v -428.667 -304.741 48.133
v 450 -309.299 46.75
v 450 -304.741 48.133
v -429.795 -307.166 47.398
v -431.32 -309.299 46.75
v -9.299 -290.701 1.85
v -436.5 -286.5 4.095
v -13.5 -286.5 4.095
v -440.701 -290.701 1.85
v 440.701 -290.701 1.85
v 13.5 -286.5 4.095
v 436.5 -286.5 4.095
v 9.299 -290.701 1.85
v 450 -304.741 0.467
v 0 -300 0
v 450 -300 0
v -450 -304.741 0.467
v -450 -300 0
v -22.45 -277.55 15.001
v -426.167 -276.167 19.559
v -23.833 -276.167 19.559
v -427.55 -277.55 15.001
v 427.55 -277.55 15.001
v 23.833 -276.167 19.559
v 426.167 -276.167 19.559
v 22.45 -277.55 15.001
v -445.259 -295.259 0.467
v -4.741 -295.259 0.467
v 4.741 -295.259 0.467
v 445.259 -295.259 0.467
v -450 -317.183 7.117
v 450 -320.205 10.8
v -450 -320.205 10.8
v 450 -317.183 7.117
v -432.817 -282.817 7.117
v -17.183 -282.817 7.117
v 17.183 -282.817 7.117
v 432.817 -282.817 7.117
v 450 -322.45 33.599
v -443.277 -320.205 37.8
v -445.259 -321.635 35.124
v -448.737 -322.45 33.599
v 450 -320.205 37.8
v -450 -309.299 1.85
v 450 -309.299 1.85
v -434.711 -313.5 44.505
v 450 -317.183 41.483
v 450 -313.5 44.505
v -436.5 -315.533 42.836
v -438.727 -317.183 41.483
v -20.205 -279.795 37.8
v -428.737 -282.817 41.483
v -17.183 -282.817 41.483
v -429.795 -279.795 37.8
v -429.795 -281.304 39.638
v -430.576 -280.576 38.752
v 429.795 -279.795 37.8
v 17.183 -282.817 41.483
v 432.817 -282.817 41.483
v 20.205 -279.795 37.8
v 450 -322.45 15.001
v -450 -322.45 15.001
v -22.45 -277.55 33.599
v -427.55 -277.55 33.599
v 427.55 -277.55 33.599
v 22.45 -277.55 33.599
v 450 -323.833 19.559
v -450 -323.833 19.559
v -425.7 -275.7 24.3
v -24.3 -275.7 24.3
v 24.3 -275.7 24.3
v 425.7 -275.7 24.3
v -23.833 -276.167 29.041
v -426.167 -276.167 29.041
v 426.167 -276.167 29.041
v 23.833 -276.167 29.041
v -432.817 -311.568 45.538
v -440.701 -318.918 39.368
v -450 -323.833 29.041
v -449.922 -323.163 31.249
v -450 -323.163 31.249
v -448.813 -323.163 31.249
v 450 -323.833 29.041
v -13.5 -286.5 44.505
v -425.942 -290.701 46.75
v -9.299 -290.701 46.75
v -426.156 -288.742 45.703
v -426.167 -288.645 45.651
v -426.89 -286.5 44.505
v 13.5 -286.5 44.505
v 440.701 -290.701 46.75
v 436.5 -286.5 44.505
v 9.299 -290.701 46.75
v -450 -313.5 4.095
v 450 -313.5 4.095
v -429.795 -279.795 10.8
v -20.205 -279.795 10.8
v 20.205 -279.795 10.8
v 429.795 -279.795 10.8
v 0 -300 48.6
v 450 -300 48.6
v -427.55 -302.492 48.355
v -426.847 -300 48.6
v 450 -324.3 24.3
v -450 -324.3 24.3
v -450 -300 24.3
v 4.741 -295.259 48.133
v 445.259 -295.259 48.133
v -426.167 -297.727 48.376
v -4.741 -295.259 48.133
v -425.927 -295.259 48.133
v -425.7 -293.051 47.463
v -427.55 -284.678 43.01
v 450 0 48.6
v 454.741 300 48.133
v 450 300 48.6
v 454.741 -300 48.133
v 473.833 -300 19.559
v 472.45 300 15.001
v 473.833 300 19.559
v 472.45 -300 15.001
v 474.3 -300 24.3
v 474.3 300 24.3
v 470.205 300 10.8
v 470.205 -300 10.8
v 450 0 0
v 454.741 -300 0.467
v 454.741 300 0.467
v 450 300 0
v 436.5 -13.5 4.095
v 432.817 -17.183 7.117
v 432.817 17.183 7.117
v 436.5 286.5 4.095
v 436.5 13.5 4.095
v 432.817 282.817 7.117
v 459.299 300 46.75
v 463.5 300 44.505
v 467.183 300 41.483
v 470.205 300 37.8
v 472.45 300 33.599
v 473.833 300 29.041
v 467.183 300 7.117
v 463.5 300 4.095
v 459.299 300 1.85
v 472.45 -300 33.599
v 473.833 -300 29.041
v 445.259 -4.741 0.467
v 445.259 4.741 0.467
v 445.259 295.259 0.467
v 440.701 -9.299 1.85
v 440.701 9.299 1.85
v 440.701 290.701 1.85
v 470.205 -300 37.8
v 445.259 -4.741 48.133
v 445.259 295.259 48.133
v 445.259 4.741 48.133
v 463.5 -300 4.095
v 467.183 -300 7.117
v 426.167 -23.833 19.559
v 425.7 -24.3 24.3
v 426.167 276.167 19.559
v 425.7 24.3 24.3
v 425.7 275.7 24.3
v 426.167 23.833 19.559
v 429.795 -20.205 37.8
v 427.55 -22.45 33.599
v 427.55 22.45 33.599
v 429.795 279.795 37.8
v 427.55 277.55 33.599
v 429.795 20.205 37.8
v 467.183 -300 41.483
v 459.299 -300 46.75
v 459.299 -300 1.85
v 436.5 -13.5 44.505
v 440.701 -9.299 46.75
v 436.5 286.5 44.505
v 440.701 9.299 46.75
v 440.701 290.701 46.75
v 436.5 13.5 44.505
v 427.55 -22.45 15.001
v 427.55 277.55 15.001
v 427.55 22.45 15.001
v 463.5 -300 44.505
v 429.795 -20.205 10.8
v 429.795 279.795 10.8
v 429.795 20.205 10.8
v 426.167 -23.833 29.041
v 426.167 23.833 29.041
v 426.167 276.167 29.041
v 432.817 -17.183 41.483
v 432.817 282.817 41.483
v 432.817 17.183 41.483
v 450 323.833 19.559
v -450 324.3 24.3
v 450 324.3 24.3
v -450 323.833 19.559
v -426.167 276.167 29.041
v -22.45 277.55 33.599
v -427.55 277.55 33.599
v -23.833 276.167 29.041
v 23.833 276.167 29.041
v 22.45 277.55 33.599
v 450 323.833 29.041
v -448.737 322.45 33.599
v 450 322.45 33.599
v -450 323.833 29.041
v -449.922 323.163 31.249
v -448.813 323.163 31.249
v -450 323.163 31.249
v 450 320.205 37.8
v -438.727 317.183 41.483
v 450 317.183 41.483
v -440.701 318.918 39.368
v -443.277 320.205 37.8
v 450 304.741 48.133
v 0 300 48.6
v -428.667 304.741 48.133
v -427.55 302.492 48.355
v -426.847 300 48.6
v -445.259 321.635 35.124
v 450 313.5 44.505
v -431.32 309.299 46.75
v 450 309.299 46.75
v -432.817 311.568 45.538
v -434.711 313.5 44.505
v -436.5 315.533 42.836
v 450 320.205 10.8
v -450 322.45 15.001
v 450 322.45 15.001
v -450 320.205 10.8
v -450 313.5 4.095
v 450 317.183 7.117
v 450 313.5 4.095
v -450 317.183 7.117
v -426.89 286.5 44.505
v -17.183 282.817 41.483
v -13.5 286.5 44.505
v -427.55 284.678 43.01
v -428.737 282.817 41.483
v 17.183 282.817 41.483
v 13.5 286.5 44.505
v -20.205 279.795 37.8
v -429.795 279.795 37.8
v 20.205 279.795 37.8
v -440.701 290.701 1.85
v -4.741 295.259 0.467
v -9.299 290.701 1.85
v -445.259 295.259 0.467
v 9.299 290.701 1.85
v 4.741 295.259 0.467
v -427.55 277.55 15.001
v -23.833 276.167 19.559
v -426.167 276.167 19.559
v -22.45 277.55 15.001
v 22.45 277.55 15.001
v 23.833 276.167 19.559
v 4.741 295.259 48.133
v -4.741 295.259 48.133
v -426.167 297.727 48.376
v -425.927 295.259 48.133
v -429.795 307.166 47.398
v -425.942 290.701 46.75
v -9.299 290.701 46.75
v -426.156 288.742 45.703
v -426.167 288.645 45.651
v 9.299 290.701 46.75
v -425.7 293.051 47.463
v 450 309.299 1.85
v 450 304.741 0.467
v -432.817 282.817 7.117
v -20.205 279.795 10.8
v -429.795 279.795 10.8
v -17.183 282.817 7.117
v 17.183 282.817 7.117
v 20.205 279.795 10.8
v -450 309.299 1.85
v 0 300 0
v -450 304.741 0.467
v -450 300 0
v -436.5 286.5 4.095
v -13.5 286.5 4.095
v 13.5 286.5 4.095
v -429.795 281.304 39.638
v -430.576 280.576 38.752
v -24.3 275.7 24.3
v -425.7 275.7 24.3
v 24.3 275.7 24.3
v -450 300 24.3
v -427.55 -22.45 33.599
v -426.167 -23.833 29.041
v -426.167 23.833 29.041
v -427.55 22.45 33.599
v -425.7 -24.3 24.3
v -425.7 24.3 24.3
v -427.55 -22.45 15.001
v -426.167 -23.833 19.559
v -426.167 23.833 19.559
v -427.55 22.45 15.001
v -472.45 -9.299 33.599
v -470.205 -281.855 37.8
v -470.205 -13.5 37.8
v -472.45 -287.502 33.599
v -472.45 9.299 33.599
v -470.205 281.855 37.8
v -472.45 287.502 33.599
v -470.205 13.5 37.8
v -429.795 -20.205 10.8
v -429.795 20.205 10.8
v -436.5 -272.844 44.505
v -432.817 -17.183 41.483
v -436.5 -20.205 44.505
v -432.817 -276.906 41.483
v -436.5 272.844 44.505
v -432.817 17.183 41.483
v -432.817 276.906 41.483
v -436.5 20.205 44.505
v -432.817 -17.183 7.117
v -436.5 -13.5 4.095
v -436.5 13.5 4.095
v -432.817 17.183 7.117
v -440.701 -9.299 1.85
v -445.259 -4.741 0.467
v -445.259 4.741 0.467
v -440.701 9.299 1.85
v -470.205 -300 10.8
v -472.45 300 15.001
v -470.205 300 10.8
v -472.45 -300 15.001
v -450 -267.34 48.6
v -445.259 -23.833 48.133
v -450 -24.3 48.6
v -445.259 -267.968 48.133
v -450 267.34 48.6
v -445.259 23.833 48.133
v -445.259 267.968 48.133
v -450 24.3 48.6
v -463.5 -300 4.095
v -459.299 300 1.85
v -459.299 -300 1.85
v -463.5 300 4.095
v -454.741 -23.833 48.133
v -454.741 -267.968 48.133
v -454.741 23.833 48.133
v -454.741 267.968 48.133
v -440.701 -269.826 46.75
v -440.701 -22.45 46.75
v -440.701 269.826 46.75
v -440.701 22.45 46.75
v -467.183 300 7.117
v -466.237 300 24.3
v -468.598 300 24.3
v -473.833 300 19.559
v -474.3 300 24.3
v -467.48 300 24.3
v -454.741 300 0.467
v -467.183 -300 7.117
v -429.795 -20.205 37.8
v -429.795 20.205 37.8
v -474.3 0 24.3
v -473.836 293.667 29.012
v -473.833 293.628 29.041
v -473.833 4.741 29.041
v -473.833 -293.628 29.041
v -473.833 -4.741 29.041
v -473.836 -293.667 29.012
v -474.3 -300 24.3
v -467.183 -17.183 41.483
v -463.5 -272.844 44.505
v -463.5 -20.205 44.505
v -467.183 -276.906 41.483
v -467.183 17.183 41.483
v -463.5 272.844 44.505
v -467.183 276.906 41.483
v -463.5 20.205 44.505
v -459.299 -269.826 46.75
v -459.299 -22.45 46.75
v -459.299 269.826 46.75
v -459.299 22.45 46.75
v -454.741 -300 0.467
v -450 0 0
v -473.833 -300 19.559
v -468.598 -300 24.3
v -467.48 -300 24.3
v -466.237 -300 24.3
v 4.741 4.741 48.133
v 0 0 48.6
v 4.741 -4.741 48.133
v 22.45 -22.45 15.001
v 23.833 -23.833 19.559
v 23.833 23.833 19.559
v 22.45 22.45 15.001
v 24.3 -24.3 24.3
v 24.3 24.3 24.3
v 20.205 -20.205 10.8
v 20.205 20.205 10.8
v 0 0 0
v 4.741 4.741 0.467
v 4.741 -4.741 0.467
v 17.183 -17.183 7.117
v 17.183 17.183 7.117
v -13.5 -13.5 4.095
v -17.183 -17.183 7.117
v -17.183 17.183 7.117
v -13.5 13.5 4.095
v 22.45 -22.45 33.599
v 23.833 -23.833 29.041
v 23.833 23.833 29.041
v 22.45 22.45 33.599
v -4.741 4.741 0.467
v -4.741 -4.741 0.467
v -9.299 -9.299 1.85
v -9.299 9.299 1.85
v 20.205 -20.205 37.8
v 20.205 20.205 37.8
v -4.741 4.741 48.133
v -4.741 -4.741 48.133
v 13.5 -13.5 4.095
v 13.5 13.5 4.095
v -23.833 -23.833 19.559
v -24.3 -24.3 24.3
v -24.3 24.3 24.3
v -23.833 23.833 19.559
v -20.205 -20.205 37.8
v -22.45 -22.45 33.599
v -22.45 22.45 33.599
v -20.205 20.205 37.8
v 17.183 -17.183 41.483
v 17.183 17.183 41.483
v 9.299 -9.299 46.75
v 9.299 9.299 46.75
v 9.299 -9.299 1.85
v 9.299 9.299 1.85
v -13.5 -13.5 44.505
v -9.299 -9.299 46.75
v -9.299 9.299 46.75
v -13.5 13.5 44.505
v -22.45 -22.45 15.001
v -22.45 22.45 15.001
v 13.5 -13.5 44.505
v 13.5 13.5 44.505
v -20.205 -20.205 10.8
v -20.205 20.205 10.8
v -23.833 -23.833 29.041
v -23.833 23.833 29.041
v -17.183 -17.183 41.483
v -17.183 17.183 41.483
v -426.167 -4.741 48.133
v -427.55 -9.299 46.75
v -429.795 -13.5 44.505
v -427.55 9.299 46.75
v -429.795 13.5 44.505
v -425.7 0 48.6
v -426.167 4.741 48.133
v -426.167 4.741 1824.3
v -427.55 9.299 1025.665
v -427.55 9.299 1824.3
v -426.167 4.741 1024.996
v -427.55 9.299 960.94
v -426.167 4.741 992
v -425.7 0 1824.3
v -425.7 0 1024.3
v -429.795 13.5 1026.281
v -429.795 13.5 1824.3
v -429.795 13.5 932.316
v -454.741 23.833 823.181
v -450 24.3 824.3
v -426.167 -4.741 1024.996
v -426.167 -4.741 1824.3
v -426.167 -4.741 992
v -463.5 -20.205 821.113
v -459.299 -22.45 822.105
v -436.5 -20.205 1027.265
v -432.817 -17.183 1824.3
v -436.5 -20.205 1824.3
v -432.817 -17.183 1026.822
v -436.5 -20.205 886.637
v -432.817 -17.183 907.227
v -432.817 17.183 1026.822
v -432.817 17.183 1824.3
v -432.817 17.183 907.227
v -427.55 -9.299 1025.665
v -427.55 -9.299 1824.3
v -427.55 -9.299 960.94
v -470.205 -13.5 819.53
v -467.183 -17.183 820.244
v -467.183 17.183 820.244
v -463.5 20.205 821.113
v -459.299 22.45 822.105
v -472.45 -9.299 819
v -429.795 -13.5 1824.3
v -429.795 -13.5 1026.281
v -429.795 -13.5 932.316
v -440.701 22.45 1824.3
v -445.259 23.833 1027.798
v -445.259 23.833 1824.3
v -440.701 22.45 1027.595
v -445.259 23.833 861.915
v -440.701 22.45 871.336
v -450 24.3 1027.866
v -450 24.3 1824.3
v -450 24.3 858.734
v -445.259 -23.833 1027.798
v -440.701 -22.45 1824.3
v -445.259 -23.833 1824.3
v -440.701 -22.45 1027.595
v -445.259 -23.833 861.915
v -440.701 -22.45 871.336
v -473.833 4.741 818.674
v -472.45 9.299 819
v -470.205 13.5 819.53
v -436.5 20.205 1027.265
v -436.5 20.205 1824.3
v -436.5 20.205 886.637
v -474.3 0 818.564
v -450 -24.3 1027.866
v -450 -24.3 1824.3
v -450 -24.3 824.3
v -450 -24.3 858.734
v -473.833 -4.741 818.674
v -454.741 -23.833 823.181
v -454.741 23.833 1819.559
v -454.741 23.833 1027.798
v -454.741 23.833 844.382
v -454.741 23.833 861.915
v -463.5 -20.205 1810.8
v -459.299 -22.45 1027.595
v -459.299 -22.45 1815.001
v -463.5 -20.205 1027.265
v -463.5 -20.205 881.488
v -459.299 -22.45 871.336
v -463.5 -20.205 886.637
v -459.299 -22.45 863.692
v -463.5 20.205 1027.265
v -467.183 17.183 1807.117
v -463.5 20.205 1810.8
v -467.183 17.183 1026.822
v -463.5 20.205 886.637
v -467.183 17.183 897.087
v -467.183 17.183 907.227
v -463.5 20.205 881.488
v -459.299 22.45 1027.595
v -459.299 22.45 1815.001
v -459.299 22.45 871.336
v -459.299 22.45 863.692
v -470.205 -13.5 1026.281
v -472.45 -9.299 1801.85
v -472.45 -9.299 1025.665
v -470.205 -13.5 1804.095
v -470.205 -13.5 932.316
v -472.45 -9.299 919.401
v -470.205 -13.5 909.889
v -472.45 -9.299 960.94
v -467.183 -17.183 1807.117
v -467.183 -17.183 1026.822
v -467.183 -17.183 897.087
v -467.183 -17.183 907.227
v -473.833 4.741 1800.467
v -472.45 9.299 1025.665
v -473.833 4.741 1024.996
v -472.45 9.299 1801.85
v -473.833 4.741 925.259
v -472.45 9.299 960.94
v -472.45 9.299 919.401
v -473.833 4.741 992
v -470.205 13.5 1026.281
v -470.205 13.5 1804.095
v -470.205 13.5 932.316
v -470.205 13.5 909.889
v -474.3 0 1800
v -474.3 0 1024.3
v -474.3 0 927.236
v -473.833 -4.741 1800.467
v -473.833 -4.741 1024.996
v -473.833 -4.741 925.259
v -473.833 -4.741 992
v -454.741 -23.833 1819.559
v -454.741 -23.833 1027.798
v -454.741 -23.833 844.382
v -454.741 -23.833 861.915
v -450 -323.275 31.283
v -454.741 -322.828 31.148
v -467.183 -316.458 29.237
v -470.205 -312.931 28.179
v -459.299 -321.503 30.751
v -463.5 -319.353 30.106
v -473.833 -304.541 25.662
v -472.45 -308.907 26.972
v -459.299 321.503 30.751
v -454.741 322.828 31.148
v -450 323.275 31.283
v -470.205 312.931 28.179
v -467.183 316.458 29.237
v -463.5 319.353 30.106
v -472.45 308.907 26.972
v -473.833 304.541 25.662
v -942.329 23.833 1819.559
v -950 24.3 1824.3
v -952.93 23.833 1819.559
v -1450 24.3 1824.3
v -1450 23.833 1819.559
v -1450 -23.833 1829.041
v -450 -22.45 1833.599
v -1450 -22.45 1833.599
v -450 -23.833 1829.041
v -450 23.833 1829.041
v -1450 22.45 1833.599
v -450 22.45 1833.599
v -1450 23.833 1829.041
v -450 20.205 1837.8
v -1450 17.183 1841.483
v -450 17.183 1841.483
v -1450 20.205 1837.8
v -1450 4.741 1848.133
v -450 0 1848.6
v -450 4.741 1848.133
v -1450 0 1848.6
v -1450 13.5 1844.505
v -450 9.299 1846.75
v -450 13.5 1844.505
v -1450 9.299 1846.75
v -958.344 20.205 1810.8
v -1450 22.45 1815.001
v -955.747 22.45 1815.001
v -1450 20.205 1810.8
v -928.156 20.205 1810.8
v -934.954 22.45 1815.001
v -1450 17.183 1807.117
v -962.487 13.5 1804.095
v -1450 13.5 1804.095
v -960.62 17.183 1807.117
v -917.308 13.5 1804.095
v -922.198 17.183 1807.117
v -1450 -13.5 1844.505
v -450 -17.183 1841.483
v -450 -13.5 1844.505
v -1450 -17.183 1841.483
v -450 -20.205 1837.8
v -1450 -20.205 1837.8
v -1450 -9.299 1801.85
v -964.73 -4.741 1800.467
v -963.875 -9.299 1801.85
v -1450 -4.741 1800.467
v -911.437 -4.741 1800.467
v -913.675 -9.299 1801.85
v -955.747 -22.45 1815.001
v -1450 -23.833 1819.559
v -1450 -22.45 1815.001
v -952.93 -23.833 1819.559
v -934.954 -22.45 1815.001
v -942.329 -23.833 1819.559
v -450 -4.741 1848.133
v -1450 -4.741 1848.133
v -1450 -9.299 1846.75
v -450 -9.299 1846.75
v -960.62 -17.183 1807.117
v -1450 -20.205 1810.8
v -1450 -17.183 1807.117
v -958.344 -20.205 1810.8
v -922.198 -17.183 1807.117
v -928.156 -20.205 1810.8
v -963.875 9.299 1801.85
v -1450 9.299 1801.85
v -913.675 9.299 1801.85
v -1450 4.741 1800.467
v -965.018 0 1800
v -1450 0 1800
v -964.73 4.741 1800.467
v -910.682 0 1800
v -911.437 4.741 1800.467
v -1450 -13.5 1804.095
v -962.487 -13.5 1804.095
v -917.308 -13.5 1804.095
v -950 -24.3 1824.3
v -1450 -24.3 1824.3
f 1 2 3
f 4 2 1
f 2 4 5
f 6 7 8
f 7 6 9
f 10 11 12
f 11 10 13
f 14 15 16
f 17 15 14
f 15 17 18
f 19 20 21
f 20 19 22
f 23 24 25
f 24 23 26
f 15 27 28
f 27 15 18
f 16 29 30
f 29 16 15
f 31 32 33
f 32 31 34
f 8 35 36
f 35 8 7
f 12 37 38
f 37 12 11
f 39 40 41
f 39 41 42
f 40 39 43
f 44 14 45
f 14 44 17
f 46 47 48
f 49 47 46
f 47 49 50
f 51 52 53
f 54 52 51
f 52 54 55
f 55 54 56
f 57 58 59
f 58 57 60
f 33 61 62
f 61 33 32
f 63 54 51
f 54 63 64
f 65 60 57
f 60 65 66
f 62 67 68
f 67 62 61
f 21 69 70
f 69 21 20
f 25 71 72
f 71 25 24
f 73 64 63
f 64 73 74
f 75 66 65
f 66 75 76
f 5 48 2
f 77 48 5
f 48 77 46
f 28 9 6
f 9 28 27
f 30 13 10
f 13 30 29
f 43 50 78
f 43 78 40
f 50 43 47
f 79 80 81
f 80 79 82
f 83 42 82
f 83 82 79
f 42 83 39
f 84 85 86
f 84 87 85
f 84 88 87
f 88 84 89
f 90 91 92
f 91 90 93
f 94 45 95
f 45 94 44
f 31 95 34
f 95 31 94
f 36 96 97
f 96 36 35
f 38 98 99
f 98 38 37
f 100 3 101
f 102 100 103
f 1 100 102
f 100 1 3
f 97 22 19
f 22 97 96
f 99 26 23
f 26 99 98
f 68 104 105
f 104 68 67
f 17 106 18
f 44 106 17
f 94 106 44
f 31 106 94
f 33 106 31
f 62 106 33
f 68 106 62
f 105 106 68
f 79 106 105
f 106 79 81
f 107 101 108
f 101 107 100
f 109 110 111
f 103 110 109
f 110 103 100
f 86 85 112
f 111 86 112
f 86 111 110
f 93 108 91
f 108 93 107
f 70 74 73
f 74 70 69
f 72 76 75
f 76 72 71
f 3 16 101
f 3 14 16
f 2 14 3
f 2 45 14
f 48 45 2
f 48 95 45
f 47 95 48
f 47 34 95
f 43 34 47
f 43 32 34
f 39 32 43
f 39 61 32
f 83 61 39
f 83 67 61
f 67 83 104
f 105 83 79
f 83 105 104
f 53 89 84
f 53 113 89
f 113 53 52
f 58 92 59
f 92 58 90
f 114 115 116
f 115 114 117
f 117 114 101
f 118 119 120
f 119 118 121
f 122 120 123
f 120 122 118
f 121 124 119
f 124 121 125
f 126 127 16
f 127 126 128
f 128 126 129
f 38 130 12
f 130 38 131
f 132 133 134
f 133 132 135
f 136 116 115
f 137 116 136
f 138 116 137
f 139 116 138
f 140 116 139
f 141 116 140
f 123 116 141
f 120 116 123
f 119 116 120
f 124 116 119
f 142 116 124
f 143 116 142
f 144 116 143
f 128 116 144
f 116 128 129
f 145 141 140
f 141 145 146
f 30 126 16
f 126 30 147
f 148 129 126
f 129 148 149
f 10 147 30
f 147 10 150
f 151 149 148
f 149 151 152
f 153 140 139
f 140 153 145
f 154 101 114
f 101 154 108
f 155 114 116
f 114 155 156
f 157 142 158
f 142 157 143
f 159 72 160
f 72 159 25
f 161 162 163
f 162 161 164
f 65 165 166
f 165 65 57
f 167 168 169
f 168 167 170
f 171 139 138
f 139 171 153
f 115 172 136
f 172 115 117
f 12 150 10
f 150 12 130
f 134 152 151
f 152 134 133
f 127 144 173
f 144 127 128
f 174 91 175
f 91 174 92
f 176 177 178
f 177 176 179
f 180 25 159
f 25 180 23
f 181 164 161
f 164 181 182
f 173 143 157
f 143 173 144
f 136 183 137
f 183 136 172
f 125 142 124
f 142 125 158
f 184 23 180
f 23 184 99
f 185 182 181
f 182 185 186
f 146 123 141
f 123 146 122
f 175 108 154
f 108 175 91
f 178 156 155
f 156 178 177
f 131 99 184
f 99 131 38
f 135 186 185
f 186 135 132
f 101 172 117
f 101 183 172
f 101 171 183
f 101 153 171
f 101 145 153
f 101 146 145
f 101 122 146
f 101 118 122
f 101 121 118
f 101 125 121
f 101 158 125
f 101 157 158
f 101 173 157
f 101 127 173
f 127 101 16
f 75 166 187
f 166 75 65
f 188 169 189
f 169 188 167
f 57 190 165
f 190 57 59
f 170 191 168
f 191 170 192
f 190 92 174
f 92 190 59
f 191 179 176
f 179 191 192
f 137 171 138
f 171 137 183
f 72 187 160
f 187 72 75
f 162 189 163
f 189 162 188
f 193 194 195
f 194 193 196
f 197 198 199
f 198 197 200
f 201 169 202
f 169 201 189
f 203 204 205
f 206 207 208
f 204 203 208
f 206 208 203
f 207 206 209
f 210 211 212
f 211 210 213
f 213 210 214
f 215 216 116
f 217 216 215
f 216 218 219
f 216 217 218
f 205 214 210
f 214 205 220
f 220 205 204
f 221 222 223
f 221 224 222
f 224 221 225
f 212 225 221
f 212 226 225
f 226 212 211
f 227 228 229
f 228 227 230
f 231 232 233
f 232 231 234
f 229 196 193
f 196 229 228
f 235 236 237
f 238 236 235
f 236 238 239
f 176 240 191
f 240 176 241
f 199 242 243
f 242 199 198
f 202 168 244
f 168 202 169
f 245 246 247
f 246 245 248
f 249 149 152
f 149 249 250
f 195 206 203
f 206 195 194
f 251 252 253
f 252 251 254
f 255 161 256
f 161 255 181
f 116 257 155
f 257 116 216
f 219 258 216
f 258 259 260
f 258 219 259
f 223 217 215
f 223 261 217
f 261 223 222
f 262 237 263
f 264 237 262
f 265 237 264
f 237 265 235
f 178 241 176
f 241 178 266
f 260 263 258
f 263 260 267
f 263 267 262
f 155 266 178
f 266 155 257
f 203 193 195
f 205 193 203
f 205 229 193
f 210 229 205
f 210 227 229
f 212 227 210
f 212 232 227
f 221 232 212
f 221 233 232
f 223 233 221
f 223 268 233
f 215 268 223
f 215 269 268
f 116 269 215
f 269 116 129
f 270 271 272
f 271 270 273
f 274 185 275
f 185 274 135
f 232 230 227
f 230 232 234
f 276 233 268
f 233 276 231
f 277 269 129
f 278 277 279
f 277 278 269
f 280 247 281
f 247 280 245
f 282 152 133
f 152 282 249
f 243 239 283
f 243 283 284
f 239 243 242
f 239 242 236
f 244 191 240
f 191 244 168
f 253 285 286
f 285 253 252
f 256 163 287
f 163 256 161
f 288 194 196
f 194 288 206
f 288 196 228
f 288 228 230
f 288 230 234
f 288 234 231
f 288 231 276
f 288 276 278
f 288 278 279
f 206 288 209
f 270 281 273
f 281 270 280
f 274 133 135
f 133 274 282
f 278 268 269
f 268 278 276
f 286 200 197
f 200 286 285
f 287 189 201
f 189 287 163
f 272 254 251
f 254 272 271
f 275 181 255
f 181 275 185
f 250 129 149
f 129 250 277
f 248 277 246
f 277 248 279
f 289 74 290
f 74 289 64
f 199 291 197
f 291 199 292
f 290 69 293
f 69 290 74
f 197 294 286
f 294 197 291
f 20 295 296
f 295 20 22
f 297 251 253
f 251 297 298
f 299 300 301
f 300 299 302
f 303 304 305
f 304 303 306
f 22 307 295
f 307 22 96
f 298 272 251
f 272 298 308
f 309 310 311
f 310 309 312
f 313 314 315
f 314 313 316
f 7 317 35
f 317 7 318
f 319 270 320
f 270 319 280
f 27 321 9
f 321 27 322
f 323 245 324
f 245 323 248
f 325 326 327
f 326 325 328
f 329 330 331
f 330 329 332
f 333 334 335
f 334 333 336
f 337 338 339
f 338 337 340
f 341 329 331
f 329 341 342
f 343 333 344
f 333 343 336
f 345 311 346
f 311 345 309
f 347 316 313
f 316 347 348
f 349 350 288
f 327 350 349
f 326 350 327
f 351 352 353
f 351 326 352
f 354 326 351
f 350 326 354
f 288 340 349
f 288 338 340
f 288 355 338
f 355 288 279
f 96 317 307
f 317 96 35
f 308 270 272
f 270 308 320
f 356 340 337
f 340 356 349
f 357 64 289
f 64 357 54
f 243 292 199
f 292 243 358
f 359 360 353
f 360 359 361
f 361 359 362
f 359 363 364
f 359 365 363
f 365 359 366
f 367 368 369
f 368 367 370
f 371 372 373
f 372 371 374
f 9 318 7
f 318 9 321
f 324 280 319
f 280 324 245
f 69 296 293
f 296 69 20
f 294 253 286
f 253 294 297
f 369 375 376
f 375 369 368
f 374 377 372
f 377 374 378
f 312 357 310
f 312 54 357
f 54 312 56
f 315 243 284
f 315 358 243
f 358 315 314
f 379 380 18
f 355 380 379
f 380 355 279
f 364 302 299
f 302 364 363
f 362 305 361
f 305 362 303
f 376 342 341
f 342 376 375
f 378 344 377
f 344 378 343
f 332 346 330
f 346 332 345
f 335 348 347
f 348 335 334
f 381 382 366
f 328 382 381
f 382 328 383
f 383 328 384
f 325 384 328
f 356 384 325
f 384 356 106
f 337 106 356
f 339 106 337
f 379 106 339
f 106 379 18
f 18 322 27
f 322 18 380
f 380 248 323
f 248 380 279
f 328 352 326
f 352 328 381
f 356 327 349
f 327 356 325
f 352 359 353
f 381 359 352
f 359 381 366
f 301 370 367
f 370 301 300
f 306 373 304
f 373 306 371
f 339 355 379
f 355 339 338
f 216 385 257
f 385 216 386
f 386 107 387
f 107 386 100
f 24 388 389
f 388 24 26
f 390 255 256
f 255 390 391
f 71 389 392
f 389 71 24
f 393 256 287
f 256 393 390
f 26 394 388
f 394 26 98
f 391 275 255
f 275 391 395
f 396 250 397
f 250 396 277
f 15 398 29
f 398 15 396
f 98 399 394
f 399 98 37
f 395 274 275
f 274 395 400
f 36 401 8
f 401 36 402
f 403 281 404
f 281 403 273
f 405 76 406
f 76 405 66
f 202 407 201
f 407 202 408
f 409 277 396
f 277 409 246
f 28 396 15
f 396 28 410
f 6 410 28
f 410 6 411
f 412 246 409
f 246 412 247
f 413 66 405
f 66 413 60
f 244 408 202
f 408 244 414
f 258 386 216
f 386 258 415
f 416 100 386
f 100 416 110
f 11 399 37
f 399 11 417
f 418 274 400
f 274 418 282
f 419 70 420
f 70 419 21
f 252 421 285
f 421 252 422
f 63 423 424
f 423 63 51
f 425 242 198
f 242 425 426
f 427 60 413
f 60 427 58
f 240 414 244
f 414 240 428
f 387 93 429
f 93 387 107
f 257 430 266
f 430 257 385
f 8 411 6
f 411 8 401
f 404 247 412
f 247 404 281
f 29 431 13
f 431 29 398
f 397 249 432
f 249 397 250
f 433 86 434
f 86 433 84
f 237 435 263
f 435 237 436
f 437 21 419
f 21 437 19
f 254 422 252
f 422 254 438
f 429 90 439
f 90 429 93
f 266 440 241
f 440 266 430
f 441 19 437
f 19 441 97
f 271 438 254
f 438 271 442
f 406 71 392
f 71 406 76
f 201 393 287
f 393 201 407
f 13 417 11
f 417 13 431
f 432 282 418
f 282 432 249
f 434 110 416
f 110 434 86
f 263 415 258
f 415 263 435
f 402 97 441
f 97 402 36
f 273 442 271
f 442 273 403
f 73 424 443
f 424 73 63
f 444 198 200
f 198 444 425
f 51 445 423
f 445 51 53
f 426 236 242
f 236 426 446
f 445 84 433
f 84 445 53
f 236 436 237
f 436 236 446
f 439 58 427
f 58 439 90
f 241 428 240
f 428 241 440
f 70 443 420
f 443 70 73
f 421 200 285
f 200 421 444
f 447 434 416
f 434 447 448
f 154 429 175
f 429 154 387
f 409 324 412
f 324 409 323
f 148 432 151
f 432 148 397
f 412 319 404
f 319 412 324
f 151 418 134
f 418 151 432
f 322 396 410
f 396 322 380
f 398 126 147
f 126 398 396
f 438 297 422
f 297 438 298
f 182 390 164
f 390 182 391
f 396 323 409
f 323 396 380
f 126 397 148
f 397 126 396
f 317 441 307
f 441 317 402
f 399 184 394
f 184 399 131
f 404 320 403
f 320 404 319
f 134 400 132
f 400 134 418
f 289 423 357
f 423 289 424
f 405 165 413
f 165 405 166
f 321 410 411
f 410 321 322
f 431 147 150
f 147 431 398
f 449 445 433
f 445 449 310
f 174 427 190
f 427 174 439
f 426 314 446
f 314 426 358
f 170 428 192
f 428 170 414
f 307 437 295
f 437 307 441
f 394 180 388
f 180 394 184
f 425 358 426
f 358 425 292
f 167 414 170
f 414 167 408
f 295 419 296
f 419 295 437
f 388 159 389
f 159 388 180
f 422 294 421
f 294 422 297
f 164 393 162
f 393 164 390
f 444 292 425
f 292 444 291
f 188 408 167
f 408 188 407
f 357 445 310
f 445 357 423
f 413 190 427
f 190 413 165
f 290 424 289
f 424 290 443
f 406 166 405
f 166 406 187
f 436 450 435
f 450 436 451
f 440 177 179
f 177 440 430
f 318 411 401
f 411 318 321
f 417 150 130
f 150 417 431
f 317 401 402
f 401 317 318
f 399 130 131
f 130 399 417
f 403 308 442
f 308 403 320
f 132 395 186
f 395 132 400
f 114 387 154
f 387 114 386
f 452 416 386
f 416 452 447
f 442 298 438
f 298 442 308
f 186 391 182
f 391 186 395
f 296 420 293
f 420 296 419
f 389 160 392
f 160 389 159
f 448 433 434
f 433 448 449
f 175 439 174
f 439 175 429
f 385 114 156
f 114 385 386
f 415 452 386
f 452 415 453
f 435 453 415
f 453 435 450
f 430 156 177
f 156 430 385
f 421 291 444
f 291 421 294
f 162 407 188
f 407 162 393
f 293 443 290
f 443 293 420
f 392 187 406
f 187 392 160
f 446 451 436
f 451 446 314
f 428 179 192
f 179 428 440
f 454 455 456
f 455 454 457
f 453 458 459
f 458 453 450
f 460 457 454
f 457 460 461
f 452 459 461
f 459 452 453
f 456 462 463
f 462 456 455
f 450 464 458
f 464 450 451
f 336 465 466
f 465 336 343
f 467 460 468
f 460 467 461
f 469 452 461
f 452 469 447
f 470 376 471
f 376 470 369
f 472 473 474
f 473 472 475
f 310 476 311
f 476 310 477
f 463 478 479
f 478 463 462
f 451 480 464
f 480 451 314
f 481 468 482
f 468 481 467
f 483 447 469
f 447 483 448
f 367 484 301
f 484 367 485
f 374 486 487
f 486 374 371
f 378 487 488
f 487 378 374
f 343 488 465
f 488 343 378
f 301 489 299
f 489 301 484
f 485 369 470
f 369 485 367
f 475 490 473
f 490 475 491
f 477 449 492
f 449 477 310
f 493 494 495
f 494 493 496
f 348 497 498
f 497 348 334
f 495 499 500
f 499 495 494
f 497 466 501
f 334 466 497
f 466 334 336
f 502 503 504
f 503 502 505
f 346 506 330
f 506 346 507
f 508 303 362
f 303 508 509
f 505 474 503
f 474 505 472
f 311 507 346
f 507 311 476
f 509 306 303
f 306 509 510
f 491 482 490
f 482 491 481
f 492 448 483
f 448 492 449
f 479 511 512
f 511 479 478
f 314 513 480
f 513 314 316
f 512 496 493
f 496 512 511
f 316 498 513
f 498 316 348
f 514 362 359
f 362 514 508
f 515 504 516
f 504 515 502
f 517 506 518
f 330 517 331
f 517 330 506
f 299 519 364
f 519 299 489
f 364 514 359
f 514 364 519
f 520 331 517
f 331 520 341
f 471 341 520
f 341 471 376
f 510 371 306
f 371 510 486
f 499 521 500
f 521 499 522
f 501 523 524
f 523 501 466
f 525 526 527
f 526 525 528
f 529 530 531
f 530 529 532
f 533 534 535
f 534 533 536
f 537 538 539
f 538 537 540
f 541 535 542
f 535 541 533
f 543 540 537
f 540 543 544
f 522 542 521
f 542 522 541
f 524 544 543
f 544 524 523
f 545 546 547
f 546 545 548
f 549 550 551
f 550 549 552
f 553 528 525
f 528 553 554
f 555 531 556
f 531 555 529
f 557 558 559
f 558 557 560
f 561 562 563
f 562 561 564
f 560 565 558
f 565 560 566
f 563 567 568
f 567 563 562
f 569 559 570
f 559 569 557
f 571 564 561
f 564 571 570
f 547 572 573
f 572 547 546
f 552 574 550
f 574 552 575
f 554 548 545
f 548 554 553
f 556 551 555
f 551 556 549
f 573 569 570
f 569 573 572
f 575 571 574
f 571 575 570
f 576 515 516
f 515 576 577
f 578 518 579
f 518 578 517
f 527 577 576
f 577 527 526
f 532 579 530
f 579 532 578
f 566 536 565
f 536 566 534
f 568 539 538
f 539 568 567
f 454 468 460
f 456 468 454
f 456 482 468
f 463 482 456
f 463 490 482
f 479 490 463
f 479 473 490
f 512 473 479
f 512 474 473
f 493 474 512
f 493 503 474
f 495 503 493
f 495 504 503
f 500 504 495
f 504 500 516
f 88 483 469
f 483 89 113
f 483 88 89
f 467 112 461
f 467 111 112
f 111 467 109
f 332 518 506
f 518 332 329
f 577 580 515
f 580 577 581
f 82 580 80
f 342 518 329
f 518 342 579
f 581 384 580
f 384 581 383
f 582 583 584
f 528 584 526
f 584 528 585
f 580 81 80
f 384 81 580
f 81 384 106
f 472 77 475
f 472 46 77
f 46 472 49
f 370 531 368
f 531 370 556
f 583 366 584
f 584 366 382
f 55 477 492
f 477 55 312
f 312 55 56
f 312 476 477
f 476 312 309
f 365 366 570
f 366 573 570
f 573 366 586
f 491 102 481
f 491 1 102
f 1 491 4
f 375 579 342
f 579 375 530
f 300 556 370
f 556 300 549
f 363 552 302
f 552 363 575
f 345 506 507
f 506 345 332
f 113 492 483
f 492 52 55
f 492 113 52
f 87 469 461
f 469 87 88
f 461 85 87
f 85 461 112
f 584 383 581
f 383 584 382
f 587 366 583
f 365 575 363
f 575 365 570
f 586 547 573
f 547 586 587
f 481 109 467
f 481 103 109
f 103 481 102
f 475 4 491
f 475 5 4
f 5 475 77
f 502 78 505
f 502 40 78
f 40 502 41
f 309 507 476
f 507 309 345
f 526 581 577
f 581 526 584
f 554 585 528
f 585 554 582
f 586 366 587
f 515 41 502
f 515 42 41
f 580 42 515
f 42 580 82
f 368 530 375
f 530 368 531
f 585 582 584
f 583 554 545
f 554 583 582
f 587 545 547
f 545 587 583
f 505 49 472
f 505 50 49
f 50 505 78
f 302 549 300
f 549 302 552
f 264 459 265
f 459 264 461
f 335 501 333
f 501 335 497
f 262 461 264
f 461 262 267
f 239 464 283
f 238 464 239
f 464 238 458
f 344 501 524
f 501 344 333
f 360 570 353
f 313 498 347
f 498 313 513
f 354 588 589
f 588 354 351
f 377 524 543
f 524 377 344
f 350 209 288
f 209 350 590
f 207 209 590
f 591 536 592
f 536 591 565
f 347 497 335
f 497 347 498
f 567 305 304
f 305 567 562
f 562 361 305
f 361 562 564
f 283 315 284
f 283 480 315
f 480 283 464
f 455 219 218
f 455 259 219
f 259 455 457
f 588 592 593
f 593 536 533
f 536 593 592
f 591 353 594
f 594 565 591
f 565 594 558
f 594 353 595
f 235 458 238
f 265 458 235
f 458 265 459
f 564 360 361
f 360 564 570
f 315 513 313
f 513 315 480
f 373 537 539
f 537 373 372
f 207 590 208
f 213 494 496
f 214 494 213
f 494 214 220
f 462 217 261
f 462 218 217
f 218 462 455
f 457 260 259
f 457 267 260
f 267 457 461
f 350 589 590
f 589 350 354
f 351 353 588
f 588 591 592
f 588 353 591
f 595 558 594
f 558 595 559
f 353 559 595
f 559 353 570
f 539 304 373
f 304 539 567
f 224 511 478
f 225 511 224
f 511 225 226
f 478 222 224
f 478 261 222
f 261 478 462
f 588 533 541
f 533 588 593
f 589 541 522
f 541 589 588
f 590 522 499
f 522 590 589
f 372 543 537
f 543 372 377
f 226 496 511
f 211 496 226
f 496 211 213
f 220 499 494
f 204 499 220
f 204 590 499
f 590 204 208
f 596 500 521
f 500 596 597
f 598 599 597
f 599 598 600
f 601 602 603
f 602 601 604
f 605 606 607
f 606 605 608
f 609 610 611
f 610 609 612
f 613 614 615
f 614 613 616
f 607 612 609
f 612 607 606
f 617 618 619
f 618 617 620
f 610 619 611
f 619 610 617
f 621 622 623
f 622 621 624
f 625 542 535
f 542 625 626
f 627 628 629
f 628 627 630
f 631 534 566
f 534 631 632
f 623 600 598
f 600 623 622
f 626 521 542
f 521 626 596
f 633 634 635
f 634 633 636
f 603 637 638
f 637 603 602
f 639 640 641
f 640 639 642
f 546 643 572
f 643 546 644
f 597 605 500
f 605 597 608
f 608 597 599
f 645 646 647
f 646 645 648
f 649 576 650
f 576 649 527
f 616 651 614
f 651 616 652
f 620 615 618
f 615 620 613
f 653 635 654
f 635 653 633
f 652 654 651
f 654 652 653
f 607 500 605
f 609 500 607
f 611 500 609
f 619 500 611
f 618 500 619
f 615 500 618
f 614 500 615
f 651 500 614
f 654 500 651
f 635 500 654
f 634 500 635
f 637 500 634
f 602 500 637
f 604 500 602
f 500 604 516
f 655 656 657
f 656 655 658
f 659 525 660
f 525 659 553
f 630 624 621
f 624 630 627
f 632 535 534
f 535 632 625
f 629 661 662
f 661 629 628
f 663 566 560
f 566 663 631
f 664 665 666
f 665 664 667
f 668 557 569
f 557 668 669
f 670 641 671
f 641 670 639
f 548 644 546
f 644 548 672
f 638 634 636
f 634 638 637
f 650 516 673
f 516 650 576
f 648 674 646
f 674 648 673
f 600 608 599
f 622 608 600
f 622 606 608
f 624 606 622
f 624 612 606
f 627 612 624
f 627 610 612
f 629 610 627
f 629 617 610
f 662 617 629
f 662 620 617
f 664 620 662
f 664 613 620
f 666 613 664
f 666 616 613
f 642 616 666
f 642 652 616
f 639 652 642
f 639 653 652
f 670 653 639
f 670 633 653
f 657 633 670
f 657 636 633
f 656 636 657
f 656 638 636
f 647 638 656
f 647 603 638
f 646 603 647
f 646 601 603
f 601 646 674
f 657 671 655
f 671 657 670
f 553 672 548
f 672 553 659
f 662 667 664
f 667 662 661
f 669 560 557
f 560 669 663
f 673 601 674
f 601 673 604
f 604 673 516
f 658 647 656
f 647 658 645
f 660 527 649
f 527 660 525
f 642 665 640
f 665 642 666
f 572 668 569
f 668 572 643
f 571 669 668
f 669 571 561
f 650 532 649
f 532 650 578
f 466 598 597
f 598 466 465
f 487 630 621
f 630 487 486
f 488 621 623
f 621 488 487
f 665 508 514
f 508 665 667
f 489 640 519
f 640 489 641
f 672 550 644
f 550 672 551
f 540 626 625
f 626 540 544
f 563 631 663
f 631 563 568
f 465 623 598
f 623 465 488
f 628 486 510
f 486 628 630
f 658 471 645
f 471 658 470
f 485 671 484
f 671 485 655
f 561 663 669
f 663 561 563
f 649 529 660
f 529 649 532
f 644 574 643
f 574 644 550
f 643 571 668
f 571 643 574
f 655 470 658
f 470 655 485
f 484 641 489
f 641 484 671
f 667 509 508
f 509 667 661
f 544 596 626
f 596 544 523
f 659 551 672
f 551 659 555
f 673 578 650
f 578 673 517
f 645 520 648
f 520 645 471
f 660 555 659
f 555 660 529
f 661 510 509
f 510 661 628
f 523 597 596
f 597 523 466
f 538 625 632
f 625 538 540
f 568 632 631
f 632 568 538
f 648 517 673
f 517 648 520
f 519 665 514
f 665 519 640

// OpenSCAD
// Generated from crane_pynite.py
pipe_od = 48.6;
$fn = 32;


function vadd(a,b) = [a[0]+b[0], a[1]+b[1], a[2]+b[2]];
function vsub(a,b) = [a[0]-b[0], a[1]-b[1], a[2]-b[2]];
function vlen(v)   = sqrt(v[0]*v[0] + v[1]*v[1] + v[2]*v[2]);

module pipe_segment(p1, p2, od=pipe_od) {
    v   = vsub(p2, p1);
    len = vlen(v);

    if (len > 0) {
        axis  = [-v[1], v[0], 0]; 
        angle = acos(v[2]/len);

        r = od/2;

        translate(p1)
            rotate(a = angle, v = axis)
                cylinder(h = len, r = r);
    }
}

// Model Geometry
union() {
    // Member: M_base_FL_FR
    pipe_segment([-450.0, -300.0, 24.3], [450.0, -300.0, 24.3]);
    // Member: M_base_FR_RR
    pipe_segment([450.0, -300.0, 24.3], [450.0, 300.0, 24.3]);
    // Member: M_base_RR_RL
    pipe_segment([450.0, 300.0, 24.3], [-450.0, 300.0, 24.3]);
    // Member: M_base_RL_FL
    pipe_segment([-450.0, 300.0, 24.3], [-450.0, -300.0, 24.3]);
    // Member: M_base_Fmid_Rmid
    pipe_segment([0.0, -300.0, 24.3], [0.0, 300.0, 24.3]);
    // Member: M_base_Lmid_RmidX0
    pipe_segment([-450.0, 0.0, 24.3], [450.0, 0.0, 24.3]);
    // Member: M_mast_1
    pipe_segment([-450.0, 0.0, 24.3], [-450.0, 0.0, 824.3]);
    // Member: M_mast_2
    pipe_segment([-450.0, 0.0, 824.3], [-450.0, 0.0, 1024.3]);
    // Member: M_mast_3
    pipe_segment([-450.0, 0.0, 1024.3], [-450.0, 0.0, 1824.3]);
    // Member: M_tripod_FL
    pipe_segment([-450.0, 0.0, 1024.3], [-450.0, -300.0, 24.3]);
    // Member: M_tripod_RL
    pipe_segment([-450.0, 0.0, 1024.3], [-450.0, 300.0, 24.3]);
    // Member: M_arm
    pipe_segment([-450.0, 0.0, 1824.3], [-1450.0, 1.2246467991473532e-13, 1824.3]);
    // Member: M_brace
    pipe_segment([-450.0, 0.0, 824.3], [-950.0, 6.123233995736766e-14, 1824.3]);
}
